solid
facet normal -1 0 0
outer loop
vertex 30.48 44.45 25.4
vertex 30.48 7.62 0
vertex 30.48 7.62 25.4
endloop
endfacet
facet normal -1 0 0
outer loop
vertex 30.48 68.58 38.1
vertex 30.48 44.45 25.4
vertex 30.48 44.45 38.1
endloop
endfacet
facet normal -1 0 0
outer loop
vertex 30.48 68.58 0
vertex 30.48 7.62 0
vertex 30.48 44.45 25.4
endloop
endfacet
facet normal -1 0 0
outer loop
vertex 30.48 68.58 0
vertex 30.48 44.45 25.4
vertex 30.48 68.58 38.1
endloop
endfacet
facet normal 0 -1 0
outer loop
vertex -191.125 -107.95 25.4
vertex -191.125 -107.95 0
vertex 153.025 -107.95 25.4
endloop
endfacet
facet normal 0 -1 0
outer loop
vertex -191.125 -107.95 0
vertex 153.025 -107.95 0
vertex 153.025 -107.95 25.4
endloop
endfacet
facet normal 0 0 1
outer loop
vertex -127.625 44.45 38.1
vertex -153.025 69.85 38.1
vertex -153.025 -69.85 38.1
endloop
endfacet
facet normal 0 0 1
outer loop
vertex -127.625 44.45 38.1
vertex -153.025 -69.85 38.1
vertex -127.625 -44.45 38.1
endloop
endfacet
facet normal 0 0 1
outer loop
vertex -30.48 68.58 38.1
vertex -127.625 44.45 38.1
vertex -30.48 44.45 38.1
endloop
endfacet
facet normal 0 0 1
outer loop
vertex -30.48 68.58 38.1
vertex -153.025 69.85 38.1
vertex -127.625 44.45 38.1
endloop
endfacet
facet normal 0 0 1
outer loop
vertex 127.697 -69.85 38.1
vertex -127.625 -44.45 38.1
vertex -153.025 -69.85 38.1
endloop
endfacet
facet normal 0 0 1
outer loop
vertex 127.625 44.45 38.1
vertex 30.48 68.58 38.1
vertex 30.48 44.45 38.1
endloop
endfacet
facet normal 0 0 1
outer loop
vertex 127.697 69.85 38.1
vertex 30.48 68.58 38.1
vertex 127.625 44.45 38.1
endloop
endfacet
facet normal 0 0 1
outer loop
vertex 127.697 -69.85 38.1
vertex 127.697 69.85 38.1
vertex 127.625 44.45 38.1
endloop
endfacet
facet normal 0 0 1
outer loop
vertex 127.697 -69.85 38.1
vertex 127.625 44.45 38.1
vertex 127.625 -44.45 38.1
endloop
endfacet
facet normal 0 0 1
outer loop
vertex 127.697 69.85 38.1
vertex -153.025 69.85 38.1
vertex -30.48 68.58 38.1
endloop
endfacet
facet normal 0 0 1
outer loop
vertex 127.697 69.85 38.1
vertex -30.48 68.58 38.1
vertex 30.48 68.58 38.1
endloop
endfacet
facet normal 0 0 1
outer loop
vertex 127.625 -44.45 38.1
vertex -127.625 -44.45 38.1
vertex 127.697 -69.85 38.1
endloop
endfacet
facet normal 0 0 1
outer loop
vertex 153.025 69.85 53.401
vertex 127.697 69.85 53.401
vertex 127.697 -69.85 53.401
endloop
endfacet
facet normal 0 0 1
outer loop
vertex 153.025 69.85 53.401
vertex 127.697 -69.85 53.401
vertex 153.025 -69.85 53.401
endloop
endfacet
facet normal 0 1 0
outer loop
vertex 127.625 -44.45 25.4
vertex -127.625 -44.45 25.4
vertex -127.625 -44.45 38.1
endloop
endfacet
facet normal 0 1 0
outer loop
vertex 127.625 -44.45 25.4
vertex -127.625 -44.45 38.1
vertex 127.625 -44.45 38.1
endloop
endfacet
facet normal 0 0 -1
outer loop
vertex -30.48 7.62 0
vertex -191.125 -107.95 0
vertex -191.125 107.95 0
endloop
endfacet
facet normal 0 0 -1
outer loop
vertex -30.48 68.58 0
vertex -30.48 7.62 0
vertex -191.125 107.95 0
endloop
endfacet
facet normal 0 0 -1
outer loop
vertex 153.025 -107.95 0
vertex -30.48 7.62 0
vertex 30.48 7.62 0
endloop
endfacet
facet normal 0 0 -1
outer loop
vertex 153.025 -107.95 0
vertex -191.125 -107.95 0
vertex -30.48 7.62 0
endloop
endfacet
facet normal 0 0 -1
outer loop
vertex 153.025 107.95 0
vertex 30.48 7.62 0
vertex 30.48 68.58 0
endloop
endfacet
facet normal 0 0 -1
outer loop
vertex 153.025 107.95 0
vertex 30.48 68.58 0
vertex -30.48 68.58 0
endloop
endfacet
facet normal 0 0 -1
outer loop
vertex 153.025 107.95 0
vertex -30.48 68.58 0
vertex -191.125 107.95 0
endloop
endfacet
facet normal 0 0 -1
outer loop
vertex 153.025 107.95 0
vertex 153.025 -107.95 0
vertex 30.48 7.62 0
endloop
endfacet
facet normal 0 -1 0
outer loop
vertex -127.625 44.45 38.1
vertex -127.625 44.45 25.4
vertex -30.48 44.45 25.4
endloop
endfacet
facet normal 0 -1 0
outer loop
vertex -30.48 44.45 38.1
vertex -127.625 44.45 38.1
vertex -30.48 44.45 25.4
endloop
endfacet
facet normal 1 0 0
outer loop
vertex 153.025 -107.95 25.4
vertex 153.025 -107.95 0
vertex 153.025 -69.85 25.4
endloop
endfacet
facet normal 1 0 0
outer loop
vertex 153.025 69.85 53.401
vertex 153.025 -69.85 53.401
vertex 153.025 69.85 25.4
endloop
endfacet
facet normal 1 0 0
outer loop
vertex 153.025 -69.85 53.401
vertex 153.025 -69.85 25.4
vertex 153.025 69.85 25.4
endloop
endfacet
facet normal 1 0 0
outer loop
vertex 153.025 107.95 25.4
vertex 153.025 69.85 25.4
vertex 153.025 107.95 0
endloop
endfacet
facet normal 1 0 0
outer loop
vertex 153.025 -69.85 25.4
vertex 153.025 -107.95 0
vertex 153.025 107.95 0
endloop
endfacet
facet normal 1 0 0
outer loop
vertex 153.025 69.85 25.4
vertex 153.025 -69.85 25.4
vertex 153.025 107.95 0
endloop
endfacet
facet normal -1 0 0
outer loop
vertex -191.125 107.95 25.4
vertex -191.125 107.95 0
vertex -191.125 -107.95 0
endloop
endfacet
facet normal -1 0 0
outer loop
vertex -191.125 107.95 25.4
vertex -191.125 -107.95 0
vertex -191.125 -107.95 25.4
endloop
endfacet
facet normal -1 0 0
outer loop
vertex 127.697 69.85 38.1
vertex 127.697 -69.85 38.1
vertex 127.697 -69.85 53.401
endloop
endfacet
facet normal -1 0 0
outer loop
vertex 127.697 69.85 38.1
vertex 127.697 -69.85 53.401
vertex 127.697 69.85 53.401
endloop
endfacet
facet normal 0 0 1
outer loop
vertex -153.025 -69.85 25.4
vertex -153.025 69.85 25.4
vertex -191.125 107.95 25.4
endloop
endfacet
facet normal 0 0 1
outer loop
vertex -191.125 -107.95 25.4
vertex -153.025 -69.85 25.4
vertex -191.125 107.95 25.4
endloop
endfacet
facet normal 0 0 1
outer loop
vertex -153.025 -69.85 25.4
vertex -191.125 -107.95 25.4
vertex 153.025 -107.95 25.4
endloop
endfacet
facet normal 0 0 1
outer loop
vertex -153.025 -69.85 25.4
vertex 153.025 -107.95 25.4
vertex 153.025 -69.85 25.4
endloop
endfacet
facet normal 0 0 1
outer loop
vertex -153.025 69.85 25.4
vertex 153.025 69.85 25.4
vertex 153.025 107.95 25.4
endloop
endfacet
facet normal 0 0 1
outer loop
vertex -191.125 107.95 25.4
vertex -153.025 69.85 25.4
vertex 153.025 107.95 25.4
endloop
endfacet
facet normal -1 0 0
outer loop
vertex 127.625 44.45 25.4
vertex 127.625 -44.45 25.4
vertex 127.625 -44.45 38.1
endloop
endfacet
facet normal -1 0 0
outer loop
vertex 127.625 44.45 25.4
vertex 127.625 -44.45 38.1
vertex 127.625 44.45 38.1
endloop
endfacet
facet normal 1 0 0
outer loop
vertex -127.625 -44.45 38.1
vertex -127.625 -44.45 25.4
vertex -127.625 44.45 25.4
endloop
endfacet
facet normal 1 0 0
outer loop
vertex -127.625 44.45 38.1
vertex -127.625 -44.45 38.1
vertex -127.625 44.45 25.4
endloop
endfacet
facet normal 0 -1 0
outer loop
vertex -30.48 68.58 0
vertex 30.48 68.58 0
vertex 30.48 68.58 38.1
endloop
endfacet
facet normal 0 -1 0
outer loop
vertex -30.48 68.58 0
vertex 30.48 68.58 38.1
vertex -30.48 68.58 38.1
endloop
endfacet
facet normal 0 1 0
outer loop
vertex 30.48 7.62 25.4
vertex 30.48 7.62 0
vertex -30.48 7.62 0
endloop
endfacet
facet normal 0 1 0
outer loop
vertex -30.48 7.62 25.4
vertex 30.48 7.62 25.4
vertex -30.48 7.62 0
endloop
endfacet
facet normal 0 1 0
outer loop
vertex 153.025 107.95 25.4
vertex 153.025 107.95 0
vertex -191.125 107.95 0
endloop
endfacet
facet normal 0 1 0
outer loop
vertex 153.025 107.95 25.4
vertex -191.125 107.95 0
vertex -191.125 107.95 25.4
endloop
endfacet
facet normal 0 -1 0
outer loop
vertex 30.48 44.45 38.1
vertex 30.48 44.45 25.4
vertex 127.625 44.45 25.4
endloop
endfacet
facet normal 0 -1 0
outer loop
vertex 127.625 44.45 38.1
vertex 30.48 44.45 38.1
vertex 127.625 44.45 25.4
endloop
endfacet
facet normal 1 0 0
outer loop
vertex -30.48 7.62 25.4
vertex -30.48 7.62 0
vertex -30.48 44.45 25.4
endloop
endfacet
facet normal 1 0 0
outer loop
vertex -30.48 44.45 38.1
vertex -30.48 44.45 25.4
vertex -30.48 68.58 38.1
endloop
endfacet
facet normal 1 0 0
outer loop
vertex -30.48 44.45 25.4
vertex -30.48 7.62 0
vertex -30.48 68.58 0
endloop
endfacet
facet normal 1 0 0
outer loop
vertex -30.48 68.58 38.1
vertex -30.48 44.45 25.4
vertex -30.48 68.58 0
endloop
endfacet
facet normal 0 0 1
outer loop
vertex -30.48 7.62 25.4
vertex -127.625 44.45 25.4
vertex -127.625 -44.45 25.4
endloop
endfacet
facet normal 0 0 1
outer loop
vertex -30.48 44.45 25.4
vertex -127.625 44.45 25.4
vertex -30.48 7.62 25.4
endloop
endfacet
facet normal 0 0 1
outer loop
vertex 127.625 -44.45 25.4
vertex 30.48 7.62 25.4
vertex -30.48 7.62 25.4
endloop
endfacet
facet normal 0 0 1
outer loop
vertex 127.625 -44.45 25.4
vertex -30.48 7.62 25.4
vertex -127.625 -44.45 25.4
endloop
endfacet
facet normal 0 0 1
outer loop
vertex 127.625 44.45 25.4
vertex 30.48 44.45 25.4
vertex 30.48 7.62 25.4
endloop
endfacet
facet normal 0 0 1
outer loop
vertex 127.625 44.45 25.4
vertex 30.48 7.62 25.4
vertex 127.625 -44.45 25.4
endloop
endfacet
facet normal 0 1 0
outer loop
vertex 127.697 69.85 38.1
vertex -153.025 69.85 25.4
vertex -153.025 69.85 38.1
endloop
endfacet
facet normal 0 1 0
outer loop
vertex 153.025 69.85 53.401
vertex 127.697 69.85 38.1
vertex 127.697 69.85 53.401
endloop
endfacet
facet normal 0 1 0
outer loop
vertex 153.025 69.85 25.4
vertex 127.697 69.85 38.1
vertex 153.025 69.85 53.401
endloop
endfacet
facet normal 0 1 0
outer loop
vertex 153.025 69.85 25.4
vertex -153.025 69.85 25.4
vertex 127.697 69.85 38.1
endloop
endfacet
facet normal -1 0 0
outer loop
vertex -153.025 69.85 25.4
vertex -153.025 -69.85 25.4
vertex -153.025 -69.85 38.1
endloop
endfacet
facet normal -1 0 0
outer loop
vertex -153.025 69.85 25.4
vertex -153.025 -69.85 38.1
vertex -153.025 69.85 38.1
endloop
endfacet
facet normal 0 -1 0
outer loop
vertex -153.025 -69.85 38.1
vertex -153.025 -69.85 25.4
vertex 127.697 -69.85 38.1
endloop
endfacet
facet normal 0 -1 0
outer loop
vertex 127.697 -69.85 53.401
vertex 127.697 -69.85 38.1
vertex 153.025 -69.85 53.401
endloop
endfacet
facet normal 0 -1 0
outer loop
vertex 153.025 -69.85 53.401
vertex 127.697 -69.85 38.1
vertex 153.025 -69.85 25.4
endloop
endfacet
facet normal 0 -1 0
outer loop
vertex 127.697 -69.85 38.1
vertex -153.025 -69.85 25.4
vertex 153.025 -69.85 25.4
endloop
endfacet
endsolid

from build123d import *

# Parameters (mm, degrees)
SKETCH1_W           = 306.04968
SKETCH1_H           = 215.9
SKETCH1_W_2         = 255.24968
SKETCH1_H_2         = 165.1
BOSS_EXTRUDE1_DEPTH = 25.4
SKETCH10_W          = 306.04968
SKETCH10_H          = 139.69956566
SKETCH10_W_2        = 255.24968
SKETCH10_H_2        = 88.89956566
BOSS_EXTRUDE6_DEPTH = 12.7
SKETCH12_W          = 25.328039302
SKETCH12_H          = 139.69956566
BOSS_EXTRUDE7_DEPTH = 15.30096
SKETCH14_W          = 60.96
SKETCH14_H          = 60.96
CUT_EXTRUDE1_DEPTH  = 195.734349014
SKETCH5_W           = 25.4
SKETCH5_H           = 215.9
BOSS_EXTRUDE4_DEPTH = 38.1


with BuildPart() as part:
    # Sketch1 → Boss-Extrude1 (new body)
    # profile 1 of 2: a face of its own
    with BuildSketch(Plane.XY):
        Rectangle(SKETCH1_W, SKETCH1_H)
        Rectangle(SKETCH1_W_2, SKETCH1_H_2, mode=Mode.SUBTRACT)
    # profile 2 of 2: a face of its own
    with BuildSketch(Plane.XY):
        Rectangle(SKETCH1_W_2, SKETCH1_H_2)
    extrude(amount=BOSS_EXTRUDE1_DEPTH)

    # Sketch10 → Boss-Extrude6 (add)
    with BuildSketch(Plane.XY.offset(25.4)):
        Rectangle(SKETCH10_W, SKETCH10_H)
        Rectangle(SKETCH10_W_2, SKETCH10_H_2, mode=Mode.SUBTRACT)
    extrude(amount=BOSS_EXTRUDE6_DEPTH)

    # Sketch12 → Boss-Extrude7 (add)
    with BuildSketch(Plane.XY.offset(38.1)):
        with Locations((140.360820349, 0)):
            Rectangle(SKETCH12_W, SKETCH12_H)
    extrude(amount=BOSS_EXTRUDE7_DEPTH)

    # Sketch14 → Cut-Extrude1 (cut, through all)
    with BuildSketch(Plane(origin=(0, 0, 0), x_dir=(-1, 0, 0), z_dir=(0, 0, -1))):
        with Locations((0, 38.1)):
            Rectangle(SKETCH14_W, SKETCH14_H)
    extrude(amount=-CUT_EXTRUDE1_DEPTH, mode=Mode.SUBTRACT)

    # Sketch5 → Boss-Extrude4 (add)
    with BuildSketch(Plane.ZY.offset(153.02484)):
        with Locations((12.7, 0)):
            Rectangle(SKETCH5_W, SKETCH5_H)
    extrude(amount=BOSS_EXTRUDE4_DEPTH)


solid = part.part
